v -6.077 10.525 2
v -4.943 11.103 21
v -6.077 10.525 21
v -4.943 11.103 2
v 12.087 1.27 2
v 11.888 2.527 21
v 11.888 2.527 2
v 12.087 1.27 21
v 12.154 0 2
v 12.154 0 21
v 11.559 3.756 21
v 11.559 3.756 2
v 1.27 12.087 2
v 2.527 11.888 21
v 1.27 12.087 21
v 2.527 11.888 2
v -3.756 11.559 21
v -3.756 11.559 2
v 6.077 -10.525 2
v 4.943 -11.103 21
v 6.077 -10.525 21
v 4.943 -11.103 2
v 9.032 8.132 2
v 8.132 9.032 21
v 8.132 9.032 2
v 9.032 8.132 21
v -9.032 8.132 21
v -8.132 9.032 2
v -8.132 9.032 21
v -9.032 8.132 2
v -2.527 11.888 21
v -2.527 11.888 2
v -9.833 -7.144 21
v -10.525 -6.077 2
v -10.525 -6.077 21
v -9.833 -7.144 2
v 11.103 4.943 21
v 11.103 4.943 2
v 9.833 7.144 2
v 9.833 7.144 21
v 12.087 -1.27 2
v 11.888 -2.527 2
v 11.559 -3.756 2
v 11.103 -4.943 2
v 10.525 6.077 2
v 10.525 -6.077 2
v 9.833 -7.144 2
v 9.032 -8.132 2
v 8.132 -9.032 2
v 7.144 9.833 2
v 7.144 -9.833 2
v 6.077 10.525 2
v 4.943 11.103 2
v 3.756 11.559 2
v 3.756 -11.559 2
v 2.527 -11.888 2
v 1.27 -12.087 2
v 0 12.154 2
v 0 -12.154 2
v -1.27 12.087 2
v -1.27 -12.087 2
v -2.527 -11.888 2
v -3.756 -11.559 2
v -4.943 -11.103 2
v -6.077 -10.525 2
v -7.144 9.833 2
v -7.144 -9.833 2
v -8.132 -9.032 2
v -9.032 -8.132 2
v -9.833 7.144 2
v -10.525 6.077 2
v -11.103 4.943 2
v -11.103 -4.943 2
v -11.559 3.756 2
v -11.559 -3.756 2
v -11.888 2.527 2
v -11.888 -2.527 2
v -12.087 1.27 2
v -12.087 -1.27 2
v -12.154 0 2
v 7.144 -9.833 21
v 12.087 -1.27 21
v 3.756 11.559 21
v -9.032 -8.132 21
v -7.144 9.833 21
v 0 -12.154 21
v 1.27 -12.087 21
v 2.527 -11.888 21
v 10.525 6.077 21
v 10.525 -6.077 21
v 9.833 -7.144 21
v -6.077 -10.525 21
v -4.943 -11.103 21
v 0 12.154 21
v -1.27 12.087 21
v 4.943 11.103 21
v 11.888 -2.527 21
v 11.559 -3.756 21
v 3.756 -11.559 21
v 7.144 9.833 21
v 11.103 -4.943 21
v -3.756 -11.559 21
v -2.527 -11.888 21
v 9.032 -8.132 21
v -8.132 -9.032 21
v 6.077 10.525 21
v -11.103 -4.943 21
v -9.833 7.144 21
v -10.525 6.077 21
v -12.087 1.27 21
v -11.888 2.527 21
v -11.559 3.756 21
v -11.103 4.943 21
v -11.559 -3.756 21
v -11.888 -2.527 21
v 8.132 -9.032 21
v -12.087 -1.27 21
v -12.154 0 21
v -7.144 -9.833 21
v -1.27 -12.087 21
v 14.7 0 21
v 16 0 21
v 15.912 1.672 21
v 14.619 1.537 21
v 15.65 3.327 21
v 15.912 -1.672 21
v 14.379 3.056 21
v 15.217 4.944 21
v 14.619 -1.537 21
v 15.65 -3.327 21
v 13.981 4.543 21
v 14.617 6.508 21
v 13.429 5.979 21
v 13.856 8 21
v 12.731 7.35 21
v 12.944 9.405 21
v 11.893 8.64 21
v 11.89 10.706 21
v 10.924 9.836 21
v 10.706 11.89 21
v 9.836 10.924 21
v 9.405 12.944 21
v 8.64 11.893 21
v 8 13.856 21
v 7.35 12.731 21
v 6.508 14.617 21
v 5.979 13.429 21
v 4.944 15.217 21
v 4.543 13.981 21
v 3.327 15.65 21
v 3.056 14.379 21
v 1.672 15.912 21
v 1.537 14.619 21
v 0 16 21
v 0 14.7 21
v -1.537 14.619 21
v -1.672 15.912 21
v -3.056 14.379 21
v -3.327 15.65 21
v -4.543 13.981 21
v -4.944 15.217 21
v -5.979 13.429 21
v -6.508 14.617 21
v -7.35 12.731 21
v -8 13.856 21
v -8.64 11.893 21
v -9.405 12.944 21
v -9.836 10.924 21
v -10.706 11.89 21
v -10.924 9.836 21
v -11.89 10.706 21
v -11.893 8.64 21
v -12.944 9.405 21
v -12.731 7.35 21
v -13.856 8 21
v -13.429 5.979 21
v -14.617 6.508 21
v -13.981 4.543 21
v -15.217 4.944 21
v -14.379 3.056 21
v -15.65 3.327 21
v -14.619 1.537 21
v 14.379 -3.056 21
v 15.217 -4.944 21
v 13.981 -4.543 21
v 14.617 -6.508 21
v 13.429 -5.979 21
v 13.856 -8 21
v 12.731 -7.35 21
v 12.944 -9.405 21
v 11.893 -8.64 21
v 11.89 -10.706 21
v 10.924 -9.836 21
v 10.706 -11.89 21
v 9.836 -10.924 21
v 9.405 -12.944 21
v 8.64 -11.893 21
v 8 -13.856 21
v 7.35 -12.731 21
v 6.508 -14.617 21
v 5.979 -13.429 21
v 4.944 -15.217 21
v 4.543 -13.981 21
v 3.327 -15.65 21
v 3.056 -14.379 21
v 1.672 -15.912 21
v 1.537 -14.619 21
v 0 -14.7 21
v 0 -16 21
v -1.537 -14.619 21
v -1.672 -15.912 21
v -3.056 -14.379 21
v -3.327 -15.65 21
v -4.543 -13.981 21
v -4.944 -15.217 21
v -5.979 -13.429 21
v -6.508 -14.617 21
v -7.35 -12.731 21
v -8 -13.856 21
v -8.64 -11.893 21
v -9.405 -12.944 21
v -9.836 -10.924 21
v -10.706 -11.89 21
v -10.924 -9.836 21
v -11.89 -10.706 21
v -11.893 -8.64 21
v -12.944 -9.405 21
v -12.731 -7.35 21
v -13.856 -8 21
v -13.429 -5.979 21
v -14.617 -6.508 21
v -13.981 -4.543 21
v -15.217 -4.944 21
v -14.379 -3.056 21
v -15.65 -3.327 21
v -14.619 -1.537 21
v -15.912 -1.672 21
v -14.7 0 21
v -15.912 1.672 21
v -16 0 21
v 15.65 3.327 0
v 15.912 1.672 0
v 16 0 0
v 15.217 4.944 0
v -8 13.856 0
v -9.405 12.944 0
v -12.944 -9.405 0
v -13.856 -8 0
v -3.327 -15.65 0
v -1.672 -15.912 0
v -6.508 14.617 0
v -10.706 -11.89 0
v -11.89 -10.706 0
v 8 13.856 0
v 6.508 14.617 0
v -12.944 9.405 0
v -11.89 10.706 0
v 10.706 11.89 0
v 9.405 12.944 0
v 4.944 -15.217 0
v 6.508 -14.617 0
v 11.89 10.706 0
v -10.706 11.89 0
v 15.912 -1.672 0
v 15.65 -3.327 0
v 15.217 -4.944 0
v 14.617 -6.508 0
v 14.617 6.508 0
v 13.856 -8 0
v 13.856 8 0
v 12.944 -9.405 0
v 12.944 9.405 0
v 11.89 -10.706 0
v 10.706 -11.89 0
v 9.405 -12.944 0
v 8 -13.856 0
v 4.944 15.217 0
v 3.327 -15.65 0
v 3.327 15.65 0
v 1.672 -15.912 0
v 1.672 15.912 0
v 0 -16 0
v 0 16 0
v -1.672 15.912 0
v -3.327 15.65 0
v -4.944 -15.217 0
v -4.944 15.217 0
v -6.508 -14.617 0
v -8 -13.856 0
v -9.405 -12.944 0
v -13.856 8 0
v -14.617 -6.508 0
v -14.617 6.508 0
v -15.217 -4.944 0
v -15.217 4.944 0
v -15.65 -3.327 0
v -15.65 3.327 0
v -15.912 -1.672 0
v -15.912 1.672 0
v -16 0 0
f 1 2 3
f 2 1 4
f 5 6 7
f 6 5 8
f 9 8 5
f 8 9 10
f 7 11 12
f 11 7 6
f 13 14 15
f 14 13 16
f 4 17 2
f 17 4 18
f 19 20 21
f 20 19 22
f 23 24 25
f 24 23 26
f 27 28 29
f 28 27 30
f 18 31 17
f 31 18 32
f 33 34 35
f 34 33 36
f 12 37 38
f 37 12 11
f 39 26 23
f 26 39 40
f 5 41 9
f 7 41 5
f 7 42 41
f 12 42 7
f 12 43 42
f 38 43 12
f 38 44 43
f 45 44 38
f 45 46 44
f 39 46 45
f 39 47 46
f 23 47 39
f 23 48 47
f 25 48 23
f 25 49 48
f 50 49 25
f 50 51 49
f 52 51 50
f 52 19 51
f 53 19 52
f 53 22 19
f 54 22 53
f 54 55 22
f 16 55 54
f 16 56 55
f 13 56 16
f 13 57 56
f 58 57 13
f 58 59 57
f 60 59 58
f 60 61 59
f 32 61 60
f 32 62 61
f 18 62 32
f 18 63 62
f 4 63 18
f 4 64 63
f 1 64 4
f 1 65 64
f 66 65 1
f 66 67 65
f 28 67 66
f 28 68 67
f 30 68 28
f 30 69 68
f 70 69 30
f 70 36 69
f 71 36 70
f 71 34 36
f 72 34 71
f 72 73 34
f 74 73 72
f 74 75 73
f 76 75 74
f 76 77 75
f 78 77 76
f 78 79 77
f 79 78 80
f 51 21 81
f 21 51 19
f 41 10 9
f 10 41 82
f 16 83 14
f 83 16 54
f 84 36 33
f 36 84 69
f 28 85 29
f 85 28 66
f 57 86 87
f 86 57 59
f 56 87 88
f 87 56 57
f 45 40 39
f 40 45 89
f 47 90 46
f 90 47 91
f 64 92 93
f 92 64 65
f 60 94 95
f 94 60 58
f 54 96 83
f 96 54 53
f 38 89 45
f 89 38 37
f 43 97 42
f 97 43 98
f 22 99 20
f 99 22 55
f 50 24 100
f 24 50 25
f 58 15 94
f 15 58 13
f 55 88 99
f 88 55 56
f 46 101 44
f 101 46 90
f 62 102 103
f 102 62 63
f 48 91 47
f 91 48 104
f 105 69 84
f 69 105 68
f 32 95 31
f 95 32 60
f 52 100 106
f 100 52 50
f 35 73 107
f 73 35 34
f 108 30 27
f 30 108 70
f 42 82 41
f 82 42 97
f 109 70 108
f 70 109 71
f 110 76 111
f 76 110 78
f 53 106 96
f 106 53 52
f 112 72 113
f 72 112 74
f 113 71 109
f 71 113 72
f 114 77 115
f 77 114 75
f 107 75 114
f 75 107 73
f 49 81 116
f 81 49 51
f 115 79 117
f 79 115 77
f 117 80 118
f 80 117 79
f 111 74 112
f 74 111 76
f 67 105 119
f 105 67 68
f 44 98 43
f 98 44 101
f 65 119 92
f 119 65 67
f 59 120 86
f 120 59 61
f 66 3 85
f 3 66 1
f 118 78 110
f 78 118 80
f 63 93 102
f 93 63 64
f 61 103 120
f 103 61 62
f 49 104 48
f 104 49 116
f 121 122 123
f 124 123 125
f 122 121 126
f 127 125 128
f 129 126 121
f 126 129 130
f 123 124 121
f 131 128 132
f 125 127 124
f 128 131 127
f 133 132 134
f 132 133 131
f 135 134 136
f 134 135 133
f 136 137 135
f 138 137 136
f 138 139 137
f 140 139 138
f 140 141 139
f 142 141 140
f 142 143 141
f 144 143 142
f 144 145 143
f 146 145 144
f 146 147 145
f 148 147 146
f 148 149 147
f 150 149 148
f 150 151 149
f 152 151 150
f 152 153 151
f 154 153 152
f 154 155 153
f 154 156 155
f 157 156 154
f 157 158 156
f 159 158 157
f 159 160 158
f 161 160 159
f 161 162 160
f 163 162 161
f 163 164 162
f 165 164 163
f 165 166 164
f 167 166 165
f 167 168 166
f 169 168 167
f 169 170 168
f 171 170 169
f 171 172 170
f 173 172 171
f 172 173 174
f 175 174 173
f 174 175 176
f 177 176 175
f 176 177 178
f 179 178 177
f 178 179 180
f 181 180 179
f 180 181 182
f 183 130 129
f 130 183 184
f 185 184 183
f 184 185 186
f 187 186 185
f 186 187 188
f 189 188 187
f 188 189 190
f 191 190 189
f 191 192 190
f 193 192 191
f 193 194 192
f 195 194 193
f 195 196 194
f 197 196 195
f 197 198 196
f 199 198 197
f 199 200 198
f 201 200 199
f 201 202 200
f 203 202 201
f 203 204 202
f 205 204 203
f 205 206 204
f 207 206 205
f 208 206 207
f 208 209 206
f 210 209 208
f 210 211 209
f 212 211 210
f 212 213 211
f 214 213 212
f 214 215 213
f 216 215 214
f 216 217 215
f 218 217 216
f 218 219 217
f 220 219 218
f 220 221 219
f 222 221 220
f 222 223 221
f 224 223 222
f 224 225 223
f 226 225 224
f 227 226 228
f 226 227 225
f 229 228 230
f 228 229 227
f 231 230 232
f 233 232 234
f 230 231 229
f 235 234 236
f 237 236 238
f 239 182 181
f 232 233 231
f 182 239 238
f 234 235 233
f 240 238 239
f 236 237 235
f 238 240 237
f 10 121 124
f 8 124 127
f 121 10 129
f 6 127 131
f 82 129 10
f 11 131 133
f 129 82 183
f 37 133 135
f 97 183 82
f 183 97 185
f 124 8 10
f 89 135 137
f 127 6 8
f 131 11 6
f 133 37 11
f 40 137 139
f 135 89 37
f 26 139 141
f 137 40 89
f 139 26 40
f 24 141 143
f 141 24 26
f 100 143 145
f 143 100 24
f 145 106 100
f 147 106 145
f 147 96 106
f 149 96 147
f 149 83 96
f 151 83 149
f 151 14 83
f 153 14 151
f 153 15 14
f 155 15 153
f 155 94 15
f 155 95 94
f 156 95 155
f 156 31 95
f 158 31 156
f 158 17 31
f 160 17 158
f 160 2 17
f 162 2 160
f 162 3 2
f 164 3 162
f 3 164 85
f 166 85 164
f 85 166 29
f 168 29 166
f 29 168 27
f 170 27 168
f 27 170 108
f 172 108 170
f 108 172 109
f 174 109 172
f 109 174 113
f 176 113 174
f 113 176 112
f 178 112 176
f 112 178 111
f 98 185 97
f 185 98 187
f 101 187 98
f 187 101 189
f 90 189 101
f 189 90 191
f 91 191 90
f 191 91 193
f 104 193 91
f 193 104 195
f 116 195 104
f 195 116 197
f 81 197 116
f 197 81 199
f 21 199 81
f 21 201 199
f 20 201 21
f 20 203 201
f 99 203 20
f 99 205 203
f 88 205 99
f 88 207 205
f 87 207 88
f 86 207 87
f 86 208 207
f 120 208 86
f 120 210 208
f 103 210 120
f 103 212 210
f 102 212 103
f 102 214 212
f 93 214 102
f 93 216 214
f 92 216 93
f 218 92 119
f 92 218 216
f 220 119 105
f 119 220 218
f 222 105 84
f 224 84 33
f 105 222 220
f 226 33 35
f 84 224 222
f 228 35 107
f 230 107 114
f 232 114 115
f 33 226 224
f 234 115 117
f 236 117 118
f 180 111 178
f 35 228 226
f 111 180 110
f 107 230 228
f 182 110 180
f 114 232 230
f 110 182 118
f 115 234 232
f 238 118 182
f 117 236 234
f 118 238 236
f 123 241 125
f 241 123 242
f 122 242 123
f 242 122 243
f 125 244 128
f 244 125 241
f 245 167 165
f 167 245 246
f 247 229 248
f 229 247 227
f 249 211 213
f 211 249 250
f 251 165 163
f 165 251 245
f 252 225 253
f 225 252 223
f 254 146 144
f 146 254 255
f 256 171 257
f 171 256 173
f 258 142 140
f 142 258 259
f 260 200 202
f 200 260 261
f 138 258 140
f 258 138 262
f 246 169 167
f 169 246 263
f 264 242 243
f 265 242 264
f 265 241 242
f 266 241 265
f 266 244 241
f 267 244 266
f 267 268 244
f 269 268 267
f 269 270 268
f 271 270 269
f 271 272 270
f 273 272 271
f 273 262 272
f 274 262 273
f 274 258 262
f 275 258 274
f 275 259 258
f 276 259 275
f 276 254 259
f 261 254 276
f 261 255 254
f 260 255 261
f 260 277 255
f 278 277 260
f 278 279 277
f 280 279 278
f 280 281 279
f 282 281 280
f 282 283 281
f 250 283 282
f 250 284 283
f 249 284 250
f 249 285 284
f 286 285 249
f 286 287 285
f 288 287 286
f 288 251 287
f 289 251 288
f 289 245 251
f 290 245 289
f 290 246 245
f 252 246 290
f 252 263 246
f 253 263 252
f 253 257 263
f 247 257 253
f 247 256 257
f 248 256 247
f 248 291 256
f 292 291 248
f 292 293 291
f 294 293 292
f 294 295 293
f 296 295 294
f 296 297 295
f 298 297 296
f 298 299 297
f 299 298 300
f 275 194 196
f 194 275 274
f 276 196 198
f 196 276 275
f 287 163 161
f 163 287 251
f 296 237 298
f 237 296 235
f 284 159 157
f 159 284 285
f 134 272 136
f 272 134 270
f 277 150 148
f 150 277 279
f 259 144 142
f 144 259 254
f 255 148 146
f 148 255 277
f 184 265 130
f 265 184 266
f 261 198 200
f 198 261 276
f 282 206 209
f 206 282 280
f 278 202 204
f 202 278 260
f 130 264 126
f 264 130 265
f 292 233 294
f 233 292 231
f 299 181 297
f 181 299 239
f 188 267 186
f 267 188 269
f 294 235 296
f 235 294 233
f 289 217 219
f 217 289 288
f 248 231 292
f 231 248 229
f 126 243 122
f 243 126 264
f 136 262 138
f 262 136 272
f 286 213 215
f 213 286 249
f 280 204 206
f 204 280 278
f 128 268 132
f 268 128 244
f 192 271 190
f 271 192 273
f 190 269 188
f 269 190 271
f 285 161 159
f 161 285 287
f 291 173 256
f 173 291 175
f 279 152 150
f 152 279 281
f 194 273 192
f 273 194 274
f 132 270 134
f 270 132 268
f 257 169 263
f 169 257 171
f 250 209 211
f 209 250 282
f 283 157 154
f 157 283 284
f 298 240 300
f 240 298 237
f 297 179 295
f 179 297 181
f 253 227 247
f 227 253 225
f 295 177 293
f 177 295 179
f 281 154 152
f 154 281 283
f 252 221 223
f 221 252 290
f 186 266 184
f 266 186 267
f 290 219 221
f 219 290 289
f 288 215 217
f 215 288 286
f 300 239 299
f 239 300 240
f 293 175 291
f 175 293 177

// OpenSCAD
/* [Eyepiece Parameters] */
// Outer diameter of eyepiece shaft in mm
eyepiece_shaft_diameter = 23.15;
// Length of eyepiece shaft in mm
eyepiece_shaft_length = 15;
// Outer diameter of eyepiece top section in mm
eyepiece_ext_od = 28;
// Length of eyepiece top section in mm
eyepiece_ext_length = 10;

/* [Case Parameters] */
// Wall thickness of case in mm
case_thickness = 2;
// Scale factor for gap between lens and case
pad = 1.05;
// Scale factor for gap between top and bottom of case
tpad = 1.01;

/* [Print Parameters] */
part = "bot_only"; // [case:Case Only, all:Case and fake eyepiece, eyepiece:Eyepiece Only, top_only:Case Top Only, bot_only:Case Bottom Only]

/* [Hidden] */
bot_length = eyepiece_shaft_length + 2 + case_thickness*2;
bot_r = (eyepiece_ext_od/2) + case_thickness;

top_length = eyepiece_shaft_length + 2 + eyepiece_ext_length + (case_thickness*2);
top_r = bot_r + case_thickness;


$fs = 0.1;
$fa = 6;

print_part();

module print_part() {
    if (part == "eyepiece") {
        rotate([0,180,0])
        translate([0,0,-(top_length)])
        eyepiece();
    } else if (part == "top_only") {
        rotate([0,180,0])
        translate([0,0,-(top_length + case_thickness)])
        case_top();
    } else if (part == "bot_only") {
        case_bottom();
    } else if (part == "case") {
        rotate([0,180,0])
        translate([top_r*2+10, 0 ,-(top_length + case_thickness)]) 
        case_top();
        case_bottom();
    } else if (part == "all") {
        rotate([0,180,0])
        translate([top_r*2+10, 0 ,-(top_length + case_thickness)]) 
        case_top();
        translate([top_r*2+10, 0 ,0]) 
        case_bottom();        
        translate([0,0,-case_thickness])
        rotate([0,180,0])
        translate([0,0,-(top_length + case_thickness)])
        eyepiece();
    }
}


module case_top() {
    difference() {
        union() {
            translate([0,0,(top_length/2) + eyepiece_ext_length])
            cylinder(top_length/2, top_r, top_r, true);
        }
        scale([pad,pad,1]) eyepiece();
        scale([tpad,tpad,1]) case_bottom();
    }
}

module case_bottom() {

    difference() {
        translate([0,0,bot_length/2])
        cylinder(bot_length, bot_r, bot_r, true);
        scale([pad,pad,1]) eyepiece();
    }
};



module eyepiece() {
    union() {
        eyepiece_shaft();
        eyepiece_ext();
    }
}

module eyepiece_shaft() {
        translate([0,0,case_thickness + (eyepiece_shaft_length + (eyepiece_ext_length-1))/2]) 
        cylinder(eyepiece_shaft_length + (eyepiece_ext_length-1), eyepiece_shaft_diameter/2, eyepiece_shaft_diameter/2, true);    
}

module eyepiece_ext() {
        translate([0,0,case_thickness + eyepiece_shaft_length + (eyepiece_ext_length-1)])
        cylinder(eyepiece_ext_length, eyepiece_ext_od/2, eyepiece_ext_od/2, true);   
}
